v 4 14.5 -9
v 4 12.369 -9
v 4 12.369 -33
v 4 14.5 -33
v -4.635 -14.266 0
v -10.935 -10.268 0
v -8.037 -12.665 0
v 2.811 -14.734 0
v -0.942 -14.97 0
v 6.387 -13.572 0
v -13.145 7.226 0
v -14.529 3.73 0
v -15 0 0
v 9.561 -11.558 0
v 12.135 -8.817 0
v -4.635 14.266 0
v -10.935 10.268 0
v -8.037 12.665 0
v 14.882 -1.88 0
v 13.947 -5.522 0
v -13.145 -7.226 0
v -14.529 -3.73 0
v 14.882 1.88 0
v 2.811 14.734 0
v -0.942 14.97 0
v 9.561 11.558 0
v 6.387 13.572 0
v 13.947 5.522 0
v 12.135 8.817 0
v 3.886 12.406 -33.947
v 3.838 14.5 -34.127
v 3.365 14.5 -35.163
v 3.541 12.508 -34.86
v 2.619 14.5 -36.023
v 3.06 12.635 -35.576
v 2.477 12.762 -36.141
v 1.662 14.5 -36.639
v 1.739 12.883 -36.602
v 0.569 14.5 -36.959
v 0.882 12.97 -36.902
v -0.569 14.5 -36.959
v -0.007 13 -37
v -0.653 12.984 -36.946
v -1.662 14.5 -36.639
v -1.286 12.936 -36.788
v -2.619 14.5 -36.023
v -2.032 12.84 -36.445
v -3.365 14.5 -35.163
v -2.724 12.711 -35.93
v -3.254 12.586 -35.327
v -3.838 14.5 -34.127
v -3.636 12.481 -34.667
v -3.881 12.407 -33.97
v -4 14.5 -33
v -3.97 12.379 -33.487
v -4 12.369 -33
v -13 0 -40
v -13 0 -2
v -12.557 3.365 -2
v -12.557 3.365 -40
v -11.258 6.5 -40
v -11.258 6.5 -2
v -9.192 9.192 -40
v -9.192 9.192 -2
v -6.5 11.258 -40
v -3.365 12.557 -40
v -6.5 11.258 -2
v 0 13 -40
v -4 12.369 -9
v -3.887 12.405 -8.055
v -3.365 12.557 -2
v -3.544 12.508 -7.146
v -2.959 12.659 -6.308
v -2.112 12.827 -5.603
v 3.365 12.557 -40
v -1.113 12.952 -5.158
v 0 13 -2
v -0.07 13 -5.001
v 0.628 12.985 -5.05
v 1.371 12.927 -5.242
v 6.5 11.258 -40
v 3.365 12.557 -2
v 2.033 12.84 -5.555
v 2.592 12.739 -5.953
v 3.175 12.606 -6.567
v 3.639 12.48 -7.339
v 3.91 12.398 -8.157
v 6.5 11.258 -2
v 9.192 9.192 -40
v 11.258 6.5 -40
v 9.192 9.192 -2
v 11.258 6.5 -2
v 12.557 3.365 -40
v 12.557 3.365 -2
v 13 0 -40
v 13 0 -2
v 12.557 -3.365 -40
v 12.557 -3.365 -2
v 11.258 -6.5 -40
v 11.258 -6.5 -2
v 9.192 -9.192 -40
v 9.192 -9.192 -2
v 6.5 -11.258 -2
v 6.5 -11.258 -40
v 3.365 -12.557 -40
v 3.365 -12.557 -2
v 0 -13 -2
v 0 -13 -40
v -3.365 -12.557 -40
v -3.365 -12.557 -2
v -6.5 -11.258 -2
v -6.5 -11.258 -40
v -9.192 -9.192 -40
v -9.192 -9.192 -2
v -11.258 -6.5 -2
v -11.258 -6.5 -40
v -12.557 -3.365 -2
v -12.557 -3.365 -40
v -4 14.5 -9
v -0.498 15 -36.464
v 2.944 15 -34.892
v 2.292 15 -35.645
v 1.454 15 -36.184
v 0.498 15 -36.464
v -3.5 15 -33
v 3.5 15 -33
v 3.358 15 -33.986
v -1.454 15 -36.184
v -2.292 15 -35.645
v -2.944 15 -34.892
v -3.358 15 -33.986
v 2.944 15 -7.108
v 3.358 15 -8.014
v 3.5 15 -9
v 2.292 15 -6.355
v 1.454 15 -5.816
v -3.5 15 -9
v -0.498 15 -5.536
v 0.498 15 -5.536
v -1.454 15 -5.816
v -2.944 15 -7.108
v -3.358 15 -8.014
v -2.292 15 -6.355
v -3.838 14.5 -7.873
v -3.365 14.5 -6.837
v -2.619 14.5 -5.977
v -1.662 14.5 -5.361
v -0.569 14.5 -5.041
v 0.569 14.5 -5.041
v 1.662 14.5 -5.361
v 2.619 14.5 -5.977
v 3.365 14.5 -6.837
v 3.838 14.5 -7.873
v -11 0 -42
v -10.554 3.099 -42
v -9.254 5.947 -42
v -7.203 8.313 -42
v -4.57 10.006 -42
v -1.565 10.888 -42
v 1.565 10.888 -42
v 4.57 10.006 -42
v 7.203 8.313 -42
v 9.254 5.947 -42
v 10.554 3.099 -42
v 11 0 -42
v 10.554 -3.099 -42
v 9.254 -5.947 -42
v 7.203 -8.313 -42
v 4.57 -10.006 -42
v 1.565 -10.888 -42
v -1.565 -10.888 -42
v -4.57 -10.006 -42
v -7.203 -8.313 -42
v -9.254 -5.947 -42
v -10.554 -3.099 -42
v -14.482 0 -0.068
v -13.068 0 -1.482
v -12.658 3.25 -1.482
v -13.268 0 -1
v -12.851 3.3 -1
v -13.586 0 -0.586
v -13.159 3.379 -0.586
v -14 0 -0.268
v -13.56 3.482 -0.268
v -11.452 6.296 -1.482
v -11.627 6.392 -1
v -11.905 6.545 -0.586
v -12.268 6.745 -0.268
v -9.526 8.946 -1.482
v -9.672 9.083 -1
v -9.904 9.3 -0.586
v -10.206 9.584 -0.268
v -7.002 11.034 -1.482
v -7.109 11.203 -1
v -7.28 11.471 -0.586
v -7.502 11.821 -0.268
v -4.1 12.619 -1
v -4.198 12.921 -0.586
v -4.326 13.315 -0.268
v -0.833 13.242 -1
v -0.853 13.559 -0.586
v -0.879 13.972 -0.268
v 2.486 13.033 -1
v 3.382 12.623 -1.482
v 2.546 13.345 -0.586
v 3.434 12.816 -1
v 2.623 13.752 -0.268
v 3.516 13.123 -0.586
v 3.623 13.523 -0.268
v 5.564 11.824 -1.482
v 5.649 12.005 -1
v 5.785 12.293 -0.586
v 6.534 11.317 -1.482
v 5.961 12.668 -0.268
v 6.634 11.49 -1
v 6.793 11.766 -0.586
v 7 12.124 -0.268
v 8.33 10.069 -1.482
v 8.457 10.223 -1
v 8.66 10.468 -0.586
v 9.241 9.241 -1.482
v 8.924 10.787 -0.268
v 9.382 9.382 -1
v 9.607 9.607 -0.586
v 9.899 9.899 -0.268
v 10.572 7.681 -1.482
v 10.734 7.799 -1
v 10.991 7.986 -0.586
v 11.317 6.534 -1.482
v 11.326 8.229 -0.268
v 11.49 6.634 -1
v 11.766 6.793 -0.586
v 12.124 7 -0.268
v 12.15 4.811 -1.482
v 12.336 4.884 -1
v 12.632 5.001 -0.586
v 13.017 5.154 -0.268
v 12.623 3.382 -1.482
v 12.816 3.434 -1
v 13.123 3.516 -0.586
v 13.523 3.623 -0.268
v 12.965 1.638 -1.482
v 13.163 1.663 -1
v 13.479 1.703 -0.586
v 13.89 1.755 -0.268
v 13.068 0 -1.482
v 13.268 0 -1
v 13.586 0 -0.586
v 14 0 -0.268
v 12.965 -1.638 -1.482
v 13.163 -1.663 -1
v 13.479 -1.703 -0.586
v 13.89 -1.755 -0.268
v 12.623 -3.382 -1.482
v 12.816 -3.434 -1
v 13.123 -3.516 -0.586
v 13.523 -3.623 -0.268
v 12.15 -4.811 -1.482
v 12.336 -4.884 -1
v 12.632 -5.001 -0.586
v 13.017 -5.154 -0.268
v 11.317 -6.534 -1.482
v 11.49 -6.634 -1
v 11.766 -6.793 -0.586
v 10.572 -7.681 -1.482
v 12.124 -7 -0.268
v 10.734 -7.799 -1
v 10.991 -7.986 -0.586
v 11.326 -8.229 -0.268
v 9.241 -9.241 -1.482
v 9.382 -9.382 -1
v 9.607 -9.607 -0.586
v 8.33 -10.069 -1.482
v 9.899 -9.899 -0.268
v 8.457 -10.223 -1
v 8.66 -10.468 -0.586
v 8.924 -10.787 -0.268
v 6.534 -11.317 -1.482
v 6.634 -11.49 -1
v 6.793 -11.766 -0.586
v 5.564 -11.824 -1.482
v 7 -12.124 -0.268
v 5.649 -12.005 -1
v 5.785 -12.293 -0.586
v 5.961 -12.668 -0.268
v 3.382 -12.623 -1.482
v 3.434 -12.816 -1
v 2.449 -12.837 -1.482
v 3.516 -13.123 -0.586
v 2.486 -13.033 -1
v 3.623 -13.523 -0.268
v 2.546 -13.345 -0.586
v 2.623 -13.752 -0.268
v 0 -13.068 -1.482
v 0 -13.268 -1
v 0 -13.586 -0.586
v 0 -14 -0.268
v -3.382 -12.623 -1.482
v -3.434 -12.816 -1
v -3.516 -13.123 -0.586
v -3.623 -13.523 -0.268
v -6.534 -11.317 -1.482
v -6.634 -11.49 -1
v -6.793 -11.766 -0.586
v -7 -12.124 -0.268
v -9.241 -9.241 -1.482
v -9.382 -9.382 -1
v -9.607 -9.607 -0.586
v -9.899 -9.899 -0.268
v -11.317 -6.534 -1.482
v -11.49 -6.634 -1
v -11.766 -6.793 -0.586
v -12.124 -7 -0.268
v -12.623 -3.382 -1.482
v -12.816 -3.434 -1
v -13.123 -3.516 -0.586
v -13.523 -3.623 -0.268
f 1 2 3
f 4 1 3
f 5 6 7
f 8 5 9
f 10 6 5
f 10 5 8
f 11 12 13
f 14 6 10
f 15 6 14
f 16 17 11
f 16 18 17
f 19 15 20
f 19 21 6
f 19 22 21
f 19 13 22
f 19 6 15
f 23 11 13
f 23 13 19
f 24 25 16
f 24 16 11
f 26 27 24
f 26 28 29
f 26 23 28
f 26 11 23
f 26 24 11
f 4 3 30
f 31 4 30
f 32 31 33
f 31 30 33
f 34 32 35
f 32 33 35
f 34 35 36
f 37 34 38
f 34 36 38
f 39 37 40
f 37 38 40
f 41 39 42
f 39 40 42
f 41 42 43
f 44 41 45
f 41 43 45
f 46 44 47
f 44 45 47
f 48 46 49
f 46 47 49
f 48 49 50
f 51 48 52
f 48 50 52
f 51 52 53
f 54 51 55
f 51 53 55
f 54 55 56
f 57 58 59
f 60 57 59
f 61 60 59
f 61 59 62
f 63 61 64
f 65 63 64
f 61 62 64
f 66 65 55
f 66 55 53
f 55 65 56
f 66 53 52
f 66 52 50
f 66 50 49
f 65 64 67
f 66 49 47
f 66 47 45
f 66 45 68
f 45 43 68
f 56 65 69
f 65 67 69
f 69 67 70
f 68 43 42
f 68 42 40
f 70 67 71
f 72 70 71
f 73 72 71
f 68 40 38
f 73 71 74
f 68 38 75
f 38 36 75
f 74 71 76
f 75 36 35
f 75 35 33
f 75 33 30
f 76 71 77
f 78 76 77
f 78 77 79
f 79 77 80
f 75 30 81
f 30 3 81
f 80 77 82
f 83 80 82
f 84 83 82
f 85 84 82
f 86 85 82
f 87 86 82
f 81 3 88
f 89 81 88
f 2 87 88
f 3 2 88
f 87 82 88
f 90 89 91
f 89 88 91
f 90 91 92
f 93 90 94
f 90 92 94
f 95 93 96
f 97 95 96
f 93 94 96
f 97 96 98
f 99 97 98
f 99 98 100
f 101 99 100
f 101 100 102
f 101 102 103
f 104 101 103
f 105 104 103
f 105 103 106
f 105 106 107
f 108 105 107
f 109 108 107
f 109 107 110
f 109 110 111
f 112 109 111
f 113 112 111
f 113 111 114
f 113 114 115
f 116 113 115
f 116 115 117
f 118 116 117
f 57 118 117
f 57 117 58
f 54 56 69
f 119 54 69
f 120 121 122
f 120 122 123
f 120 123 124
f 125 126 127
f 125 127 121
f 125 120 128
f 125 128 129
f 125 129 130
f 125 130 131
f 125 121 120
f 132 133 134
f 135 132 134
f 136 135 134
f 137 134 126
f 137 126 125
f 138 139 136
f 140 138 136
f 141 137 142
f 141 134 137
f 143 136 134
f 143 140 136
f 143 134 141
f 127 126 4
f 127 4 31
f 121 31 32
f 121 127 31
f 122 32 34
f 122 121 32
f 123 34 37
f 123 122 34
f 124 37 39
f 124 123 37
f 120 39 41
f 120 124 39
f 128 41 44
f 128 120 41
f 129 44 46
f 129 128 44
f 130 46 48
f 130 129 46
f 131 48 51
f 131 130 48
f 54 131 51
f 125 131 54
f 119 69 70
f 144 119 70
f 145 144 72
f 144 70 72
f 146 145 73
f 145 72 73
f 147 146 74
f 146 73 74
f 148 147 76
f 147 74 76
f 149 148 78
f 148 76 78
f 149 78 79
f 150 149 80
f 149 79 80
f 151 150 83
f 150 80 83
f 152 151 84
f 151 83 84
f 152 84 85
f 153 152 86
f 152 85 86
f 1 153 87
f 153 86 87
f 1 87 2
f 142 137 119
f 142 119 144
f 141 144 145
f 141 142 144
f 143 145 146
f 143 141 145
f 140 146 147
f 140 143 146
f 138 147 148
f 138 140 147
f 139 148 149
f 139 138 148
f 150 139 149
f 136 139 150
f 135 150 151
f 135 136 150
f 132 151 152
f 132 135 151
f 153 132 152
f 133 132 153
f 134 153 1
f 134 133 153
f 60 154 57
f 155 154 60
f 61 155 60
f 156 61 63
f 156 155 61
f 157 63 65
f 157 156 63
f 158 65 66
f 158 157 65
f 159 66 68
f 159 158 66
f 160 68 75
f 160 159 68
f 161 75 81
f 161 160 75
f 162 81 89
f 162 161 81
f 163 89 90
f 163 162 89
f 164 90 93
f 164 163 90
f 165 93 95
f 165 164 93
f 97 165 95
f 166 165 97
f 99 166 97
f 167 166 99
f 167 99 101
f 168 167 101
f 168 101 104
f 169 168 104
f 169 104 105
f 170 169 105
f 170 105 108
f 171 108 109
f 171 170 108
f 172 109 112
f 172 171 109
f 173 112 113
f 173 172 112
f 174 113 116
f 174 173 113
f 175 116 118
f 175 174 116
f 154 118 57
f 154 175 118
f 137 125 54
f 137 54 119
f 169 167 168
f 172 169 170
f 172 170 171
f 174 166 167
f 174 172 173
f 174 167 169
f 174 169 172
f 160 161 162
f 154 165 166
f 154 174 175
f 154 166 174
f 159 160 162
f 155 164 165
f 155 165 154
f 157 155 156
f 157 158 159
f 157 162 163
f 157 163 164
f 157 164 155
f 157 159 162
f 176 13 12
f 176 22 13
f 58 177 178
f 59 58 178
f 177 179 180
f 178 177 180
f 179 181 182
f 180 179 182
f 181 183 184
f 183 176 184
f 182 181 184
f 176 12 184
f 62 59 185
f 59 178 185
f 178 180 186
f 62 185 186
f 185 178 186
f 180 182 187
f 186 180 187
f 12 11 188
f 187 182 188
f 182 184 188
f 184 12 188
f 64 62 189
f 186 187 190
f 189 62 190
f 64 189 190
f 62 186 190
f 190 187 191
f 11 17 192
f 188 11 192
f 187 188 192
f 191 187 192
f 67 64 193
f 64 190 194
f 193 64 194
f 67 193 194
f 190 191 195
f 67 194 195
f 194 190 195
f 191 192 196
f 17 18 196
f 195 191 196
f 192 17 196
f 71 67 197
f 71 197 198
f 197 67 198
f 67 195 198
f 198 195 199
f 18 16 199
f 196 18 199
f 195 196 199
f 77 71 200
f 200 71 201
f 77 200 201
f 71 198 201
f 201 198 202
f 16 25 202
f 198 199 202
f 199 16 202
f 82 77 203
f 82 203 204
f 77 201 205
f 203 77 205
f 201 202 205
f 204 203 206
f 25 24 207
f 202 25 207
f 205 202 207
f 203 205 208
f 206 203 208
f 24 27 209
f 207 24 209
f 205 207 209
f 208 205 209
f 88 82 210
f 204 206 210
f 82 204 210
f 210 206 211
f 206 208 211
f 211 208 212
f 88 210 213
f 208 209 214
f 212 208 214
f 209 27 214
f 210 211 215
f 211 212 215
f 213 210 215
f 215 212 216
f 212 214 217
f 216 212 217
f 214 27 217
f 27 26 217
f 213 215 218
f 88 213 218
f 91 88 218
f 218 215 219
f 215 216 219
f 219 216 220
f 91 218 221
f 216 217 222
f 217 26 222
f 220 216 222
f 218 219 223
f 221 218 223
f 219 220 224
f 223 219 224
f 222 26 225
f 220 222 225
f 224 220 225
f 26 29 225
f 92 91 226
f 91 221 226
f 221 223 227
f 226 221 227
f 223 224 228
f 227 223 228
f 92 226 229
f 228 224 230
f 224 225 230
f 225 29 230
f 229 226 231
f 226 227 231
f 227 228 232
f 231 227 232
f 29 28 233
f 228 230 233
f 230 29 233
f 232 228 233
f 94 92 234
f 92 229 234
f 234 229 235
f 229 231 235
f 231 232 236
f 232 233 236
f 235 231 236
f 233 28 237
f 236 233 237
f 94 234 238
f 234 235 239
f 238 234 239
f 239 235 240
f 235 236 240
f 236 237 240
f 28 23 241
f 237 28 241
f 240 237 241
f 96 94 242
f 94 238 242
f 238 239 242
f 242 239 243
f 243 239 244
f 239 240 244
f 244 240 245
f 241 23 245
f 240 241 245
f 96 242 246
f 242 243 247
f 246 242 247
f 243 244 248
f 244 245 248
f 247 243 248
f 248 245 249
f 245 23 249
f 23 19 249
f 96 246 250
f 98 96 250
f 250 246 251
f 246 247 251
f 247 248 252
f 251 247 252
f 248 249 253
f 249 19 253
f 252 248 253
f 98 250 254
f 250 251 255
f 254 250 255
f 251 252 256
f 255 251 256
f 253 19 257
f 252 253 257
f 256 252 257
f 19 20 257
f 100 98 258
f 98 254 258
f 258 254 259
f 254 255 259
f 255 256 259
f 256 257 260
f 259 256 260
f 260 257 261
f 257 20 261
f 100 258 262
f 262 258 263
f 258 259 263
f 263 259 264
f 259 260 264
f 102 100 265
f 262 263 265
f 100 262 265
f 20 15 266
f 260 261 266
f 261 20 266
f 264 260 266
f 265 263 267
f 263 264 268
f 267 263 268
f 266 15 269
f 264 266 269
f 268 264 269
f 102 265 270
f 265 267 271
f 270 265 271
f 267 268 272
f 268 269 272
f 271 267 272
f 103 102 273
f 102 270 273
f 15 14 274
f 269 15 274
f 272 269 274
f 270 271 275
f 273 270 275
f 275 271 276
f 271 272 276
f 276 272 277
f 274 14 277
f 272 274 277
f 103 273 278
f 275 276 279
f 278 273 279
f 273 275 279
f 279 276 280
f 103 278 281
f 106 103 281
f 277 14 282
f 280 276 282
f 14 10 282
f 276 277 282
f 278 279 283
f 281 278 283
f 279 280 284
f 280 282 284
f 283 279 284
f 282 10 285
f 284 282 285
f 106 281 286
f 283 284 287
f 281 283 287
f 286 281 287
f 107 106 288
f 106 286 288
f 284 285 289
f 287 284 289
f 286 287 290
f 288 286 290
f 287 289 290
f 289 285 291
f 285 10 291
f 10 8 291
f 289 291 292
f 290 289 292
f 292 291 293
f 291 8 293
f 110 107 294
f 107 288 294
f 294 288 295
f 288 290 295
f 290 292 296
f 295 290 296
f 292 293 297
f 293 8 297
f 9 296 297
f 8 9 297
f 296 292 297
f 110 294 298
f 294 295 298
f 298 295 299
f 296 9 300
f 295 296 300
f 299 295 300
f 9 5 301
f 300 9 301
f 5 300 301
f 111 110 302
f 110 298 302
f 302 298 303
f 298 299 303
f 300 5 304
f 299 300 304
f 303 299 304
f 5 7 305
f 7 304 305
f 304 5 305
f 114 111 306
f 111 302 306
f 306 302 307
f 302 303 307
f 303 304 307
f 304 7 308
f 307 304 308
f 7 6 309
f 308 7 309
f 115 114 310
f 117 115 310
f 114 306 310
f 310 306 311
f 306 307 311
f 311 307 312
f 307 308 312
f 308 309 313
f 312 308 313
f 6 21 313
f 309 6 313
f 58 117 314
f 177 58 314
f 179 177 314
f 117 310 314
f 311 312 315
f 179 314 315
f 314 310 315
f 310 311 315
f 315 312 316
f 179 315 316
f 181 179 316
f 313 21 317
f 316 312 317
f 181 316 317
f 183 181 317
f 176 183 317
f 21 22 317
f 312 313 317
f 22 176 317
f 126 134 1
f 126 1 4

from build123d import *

# Parameters (mm, degrees)
SKETCH_1_R          = 41.275
EXTRUDE_1_DEPTH     = 5
SKETCH_5_R          = 13
EXTRUDE_5_DEPTH     = 42
CHAMFER_3_SIZE      = 2
FILLET_1_R          = 2
EXTRUDE_START       = -0.630683
EXTRUDE_7_DEPTH     = 2.630683
CHAMFER_4_SIZE      = 0.5
SKETCH_11_R         = 65.391227149
CUT_EXTRUDE_1_DEPTH = 5


with BuildPart() as part:
    # 草图1 → 凸台-拉伸1 (new body)
    with BuildSketch(Plane.XY):
        Circle(SKETCH_1_R)
    extrude(amount=EXTRUDE_1_DEPTH)

    # 草图5 → 凸台-拉伸5 (add)
    with BuildSketch(Plane(origin=(0, 0, 0), x_dir=(-1, 0, 0), z_dir=(0, 0, -1))):
        Circle(SKETCH_5_R)
    extrude(amount=EXTRUDE_5_DEPTH)

    # 倒角3
    chamfer_3_edges = [part.edges().sort_by_distance(p)[0] for p in [
        (13, 0, -42),
    ]]
    chamfer(chamfer_3_edges, length=CHAMFER_3_SIZE)

    # 圆角1
    fillet_1_edges = [part.edges().sort_by_distance(p)[0] for p in [
        (13, 0, 0),
    ]]
    fillet(fillet_1_edges, radius=FILLET_1_R)

    # 草图10 → 凸台-拉伸7 (add)
    with BuildSketch(Plane(origin=(0, 13, 0), x_dir=(-1, 0, 0), z_dir=(0, 1, 0)).offset(EXTRUDE_START)):
        with BuildLine():
            Line((-4, -9), (-4, -33))
            ThreePointArc((-4, -33), (0, -37), (4, -33))
            Line((4, -33), (4, -9))
            ThreePointArc((4, -9), (0, -5), (-4, -9))
        make_face()
    extrude(amount=EXTRUDE_7_DEPTH)

    # 倒角4
    chamfer_4_edges = [part.edges().sort_by_distance(p)[0] for p in [
        (0, 15, -37),
        (-4, 15, -21),
        (0, 15, -5),
        (4, 15, -21),
    ]]
    chamfer(chamfer_4_edges, length=CHAMFER_4_SIZE)

    # 草图11 → 切除-拉伸1 (cut)
    with BuildSketch(Plane.XY.offset(5)):
        Circle(SKETCH_11_R)
    extrude(amount=-CUT_EXTRUDE_1_DEPTH, mode=Mode.SUBTRACT)


solid = part.part
